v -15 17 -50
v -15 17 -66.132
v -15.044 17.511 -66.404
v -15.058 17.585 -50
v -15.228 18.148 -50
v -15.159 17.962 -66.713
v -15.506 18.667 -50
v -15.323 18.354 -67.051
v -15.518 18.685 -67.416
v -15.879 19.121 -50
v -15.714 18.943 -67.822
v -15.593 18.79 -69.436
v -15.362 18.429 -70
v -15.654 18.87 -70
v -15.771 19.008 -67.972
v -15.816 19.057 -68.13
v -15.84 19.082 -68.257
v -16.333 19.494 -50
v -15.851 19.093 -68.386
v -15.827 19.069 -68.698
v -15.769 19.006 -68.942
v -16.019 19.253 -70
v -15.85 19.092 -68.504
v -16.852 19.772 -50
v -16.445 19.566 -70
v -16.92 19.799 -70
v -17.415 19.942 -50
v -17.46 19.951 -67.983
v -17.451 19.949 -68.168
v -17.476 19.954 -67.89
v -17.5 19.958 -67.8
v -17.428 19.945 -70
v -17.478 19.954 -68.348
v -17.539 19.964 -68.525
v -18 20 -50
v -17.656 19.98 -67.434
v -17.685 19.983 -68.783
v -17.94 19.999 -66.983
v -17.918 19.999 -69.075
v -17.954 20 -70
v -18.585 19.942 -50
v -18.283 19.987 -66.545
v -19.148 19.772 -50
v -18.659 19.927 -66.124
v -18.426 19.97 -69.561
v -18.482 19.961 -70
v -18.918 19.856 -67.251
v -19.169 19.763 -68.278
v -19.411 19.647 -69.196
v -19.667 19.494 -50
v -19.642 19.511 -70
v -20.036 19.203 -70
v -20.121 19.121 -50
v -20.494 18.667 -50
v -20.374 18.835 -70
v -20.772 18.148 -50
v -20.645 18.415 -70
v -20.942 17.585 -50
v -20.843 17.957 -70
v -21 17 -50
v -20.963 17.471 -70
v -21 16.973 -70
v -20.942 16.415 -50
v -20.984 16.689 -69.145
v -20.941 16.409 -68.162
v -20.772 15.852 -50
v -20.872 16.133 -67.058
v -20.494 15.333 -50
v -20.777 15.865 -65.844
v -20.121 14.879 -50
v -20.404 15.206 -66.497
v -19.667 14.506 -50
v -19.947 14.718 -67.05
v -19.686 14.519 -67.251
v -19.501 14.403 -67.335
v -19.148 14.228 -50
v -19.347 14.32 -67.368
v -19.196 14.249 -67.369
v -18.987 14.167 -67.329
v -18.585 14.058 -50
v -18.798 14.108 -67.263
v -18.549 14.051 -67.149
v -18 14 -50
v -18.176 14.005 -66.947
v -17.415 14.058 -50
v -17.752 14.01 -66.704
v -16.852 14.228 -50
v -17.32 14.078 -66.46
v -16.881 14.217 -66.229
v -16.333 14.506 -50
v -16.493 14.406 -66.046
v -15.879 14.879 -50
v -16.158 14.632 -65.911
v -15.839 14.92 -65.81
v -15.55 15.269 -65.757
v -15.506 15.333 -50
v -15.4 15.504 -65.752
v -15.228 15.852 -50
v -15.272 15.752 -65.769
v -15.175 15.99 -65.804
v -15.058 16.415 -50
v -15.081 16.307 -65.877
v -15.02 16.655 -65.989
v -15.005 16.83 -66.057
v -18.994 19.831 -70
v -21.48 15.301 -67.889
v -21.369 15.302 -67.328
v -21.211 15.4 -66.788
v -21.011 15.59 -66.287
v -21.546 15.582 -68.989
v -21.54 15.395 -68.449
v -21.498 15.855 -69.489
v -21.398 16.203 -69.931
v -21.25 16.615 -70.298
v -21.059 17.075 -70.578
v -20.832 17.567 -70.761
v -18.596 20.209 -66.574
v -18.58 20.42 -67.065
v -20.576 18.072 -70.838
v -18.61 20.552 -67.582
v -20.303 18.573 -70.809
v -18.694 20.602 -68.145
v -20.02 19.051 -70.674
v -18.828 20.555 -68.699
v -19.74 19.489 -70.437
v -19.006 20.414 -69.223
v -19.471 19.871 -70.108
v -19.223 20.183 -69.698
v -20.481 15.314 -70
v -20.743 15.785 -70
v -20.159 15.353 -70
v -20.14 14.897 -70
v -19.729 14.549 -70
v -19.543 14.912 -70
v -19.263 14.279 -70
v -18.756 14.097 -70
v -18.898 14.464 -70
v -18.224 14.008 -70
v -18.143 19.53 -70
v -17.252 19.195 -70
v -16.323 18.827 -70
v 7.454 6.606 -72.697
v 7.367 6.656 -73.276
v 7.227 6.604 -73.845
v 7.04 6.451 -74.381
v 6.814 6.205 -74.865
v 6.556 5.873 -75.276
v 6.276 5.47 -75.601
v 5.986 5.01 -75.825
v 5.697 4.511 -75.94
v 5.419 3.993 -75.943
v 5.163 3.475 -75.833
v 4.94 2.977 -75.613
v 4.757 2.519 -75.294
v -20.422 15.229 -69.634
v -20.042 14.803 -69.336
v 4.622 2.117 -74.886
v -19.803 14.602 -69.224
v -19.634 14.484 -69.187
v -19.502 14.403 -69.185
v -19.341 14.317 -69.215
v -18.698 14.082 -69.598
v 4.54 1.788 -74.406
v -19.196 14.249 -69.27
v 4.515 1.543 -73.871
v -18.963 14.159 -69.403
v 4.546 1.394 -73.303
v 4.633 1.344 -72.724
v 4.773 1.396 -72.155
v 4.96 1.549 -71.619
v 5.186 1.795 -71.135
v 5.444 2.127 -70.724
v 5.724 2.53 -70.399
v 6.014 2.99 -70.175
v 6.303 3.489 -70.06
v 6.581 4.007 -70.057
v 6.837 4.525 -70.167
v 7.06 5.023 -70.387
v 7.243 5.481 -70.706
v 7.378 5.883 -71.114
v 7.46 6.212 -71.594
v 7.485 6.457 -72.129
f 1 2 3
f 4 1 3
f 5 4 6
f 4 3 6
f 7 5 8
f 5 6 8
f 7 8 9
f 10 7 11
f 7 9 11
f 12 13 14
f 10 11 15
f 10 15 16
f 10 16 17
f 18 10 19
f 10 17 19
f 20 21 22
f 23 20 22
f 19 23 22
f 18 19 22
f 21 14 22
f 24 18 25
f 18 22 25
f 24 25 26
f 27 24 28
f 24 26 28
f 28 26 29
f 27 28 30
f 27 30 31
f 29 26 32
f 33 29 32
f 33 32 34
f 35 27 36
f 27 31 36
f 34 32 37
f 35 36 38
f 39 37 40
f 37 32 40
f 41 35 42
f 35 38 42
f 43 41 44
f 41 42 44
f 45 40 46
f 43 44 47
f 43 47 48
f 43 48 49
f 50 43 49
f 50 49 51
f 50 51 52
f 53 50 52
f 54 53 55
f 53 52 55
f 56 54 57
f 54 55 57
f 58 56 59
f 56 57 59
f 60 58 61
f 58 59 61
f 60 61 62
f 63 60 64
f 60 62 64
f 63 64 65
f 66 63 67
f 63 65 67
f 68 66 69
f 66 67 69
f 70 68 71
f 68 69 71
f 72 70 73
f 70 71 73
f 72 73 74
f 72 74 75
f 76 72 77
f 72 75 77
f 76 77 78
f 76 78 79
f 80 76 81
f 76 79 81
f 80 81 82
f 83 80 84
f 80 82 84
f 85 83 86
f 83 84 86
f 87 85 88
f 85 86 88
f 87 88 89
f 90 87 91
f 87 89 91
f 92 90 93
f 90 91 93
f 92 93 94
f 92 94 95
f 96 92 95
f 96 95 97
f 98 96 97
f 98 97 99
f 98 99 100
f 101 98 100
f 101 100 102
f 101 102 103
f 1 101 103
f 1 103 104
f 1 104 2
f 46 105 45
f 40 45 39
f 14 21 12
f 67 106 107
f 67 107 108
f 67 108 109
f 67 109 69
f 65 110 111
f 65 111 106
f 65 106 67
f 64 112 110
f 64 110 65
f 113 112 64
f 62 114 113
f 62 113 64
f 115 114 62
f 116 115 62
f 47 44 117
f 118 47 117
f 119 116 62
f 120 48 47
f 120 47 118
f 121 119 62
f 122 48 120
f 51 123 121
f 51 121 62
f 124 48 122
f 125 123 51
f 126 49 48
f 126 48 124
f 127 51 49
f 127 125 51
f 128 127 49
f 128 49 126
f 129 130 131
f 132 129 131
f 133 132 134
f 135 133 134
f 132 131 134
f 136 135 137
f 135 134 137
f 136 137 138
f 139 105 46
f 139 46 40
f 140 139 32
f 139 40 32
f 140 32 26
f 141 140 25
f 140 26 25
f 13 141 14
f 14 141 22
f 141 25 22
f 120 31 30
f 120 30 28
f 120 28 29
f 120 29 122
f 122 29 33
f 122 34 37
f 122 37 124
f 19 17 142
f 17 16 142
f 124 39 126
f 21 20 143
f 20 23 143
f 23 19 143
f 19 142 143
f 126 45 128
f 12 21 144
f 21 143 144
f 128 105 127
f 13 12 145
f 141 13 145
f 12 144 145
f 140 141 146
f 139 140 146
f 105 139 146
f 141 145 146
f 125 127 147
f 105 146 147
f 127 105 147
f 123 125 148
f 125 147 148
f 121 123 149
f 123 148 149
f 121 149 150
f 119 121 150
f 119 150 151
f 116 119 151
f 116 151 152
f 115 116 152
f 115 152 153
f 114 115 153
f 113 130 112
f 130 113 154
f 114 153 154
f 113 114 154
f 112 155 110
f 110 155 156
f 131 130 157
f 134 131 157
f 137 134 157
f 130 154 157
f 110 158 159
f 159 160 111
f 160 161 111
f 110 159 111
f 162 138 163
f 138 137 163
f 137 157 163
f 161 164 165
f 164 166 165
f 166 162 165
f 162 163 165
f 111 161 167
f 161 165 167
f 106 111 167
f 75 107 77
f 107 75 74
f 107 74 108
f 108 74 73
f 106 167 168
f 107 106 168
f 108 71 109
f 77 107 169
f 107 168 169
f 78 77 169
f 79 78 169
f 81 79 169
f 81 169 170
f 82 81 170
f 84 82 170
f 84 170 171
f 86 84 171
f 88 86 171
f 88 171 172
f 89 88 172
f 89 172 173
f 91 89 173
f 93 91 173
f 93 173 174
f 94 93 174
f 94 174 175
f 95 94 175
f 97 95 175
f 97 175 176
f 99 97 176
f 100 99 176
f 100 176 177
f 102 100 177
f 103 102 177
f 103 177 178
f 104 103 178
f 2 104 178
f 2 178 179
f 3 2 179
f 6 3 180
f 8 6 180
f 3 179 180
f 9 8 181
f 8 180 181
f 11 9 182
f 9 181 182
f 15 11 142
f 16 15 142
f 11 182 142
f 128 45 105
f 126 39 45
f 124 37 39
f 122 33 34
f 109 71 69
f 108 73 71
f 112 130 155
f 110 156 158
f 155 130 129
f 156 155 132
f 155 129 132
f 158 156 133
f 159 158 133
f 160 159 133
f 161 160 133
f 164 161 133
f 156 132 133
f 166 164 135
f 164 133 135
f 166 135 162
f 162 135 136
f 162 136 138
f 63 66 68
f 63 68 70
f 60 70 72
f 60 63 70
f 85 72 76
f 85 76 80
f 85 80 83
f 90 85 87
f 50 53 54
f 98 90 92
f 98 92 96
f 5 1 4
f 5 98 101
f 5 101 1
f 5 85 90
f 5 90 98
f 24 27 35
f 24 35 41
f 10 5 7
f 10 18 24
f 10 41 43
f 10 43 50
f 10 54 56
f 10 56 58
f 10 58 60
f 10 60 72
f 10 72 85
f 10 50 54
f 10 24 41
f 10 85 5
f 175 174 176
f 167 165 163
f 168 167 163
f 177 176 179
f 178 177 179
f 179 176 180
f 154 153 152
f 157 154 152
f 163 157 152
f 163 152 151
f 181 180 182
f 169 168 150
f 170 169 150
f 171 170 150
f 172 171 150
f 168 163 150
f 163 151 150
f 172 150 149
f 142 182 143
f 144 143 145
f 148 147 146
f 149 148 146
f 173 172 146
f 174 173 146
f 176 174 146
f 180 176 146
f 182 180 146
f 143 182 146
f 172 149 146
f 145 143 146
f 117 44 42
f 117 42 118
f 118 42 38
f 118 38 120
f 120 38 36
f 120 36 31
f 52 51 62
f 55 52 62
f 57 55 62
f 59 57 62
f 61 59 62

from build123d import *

# Parameters (mm, degrees)
CYLINDER061_R               = 3
CYLINDER061_DEPTH           = 20
CYLINDER060_R               = 3
CYLINDER060_DEPTH           = 30
CYLINDER060_ROLL_ANGLE      = -80.132309
CYLINDER060_PITCH_ANGLE     = -5.803783
CYLINDER060_PLACEMENT_ANGLE = 60.843577


with BuildPart() as cylindre057:
    # Cylinder061 → Cylinder061 (new body)
    with BuildSketch(Plane(origin=(-18, 17, -70), x_dir=(1, 0, 0), z_dir=(0, 0, 1))):
        Circle(CYLINDER061_R)
    extrude(amount=CYLINDER061_DEPTH)


with BuildPart() as fusion030:
    # Cylinder060 → Cylinder060 (new body)
    with BuildSketch(Plane.XY):
        Circle(CYLINDER060_R)
    extrude(amount=CYLINDER060_DEPTH)


with BuildPart() as fusion030_1:
    # Cylinder060 roll: moved
    add(fusion030.part.rotate(Axis((0, 0, 0), (1, 0, 0)), CYLINDER060_ROLL_ANGLE))


with BuildPart() as fusion030_2:
    # Cylinder060 pitch: moved
    add(fusion030_1.part.rotate(Axis((0, 0, 0), (0, 1, 0)), CYLINDER060_PITCH_ANGLE))


with BuildPart() as fusion030_3:
    # Cylinder060 placement: moved
    add(fusion030_2.part.moved(Location((6, 4, -73))).rotate(Axis((6, 4, -73), (0, 0, 1)), CYLINDER060_PLACEMENT_ANGLE))

    # Fusion030: union Cylindre057
    add(cylindre057.part)


solid = fusion030_3.part
